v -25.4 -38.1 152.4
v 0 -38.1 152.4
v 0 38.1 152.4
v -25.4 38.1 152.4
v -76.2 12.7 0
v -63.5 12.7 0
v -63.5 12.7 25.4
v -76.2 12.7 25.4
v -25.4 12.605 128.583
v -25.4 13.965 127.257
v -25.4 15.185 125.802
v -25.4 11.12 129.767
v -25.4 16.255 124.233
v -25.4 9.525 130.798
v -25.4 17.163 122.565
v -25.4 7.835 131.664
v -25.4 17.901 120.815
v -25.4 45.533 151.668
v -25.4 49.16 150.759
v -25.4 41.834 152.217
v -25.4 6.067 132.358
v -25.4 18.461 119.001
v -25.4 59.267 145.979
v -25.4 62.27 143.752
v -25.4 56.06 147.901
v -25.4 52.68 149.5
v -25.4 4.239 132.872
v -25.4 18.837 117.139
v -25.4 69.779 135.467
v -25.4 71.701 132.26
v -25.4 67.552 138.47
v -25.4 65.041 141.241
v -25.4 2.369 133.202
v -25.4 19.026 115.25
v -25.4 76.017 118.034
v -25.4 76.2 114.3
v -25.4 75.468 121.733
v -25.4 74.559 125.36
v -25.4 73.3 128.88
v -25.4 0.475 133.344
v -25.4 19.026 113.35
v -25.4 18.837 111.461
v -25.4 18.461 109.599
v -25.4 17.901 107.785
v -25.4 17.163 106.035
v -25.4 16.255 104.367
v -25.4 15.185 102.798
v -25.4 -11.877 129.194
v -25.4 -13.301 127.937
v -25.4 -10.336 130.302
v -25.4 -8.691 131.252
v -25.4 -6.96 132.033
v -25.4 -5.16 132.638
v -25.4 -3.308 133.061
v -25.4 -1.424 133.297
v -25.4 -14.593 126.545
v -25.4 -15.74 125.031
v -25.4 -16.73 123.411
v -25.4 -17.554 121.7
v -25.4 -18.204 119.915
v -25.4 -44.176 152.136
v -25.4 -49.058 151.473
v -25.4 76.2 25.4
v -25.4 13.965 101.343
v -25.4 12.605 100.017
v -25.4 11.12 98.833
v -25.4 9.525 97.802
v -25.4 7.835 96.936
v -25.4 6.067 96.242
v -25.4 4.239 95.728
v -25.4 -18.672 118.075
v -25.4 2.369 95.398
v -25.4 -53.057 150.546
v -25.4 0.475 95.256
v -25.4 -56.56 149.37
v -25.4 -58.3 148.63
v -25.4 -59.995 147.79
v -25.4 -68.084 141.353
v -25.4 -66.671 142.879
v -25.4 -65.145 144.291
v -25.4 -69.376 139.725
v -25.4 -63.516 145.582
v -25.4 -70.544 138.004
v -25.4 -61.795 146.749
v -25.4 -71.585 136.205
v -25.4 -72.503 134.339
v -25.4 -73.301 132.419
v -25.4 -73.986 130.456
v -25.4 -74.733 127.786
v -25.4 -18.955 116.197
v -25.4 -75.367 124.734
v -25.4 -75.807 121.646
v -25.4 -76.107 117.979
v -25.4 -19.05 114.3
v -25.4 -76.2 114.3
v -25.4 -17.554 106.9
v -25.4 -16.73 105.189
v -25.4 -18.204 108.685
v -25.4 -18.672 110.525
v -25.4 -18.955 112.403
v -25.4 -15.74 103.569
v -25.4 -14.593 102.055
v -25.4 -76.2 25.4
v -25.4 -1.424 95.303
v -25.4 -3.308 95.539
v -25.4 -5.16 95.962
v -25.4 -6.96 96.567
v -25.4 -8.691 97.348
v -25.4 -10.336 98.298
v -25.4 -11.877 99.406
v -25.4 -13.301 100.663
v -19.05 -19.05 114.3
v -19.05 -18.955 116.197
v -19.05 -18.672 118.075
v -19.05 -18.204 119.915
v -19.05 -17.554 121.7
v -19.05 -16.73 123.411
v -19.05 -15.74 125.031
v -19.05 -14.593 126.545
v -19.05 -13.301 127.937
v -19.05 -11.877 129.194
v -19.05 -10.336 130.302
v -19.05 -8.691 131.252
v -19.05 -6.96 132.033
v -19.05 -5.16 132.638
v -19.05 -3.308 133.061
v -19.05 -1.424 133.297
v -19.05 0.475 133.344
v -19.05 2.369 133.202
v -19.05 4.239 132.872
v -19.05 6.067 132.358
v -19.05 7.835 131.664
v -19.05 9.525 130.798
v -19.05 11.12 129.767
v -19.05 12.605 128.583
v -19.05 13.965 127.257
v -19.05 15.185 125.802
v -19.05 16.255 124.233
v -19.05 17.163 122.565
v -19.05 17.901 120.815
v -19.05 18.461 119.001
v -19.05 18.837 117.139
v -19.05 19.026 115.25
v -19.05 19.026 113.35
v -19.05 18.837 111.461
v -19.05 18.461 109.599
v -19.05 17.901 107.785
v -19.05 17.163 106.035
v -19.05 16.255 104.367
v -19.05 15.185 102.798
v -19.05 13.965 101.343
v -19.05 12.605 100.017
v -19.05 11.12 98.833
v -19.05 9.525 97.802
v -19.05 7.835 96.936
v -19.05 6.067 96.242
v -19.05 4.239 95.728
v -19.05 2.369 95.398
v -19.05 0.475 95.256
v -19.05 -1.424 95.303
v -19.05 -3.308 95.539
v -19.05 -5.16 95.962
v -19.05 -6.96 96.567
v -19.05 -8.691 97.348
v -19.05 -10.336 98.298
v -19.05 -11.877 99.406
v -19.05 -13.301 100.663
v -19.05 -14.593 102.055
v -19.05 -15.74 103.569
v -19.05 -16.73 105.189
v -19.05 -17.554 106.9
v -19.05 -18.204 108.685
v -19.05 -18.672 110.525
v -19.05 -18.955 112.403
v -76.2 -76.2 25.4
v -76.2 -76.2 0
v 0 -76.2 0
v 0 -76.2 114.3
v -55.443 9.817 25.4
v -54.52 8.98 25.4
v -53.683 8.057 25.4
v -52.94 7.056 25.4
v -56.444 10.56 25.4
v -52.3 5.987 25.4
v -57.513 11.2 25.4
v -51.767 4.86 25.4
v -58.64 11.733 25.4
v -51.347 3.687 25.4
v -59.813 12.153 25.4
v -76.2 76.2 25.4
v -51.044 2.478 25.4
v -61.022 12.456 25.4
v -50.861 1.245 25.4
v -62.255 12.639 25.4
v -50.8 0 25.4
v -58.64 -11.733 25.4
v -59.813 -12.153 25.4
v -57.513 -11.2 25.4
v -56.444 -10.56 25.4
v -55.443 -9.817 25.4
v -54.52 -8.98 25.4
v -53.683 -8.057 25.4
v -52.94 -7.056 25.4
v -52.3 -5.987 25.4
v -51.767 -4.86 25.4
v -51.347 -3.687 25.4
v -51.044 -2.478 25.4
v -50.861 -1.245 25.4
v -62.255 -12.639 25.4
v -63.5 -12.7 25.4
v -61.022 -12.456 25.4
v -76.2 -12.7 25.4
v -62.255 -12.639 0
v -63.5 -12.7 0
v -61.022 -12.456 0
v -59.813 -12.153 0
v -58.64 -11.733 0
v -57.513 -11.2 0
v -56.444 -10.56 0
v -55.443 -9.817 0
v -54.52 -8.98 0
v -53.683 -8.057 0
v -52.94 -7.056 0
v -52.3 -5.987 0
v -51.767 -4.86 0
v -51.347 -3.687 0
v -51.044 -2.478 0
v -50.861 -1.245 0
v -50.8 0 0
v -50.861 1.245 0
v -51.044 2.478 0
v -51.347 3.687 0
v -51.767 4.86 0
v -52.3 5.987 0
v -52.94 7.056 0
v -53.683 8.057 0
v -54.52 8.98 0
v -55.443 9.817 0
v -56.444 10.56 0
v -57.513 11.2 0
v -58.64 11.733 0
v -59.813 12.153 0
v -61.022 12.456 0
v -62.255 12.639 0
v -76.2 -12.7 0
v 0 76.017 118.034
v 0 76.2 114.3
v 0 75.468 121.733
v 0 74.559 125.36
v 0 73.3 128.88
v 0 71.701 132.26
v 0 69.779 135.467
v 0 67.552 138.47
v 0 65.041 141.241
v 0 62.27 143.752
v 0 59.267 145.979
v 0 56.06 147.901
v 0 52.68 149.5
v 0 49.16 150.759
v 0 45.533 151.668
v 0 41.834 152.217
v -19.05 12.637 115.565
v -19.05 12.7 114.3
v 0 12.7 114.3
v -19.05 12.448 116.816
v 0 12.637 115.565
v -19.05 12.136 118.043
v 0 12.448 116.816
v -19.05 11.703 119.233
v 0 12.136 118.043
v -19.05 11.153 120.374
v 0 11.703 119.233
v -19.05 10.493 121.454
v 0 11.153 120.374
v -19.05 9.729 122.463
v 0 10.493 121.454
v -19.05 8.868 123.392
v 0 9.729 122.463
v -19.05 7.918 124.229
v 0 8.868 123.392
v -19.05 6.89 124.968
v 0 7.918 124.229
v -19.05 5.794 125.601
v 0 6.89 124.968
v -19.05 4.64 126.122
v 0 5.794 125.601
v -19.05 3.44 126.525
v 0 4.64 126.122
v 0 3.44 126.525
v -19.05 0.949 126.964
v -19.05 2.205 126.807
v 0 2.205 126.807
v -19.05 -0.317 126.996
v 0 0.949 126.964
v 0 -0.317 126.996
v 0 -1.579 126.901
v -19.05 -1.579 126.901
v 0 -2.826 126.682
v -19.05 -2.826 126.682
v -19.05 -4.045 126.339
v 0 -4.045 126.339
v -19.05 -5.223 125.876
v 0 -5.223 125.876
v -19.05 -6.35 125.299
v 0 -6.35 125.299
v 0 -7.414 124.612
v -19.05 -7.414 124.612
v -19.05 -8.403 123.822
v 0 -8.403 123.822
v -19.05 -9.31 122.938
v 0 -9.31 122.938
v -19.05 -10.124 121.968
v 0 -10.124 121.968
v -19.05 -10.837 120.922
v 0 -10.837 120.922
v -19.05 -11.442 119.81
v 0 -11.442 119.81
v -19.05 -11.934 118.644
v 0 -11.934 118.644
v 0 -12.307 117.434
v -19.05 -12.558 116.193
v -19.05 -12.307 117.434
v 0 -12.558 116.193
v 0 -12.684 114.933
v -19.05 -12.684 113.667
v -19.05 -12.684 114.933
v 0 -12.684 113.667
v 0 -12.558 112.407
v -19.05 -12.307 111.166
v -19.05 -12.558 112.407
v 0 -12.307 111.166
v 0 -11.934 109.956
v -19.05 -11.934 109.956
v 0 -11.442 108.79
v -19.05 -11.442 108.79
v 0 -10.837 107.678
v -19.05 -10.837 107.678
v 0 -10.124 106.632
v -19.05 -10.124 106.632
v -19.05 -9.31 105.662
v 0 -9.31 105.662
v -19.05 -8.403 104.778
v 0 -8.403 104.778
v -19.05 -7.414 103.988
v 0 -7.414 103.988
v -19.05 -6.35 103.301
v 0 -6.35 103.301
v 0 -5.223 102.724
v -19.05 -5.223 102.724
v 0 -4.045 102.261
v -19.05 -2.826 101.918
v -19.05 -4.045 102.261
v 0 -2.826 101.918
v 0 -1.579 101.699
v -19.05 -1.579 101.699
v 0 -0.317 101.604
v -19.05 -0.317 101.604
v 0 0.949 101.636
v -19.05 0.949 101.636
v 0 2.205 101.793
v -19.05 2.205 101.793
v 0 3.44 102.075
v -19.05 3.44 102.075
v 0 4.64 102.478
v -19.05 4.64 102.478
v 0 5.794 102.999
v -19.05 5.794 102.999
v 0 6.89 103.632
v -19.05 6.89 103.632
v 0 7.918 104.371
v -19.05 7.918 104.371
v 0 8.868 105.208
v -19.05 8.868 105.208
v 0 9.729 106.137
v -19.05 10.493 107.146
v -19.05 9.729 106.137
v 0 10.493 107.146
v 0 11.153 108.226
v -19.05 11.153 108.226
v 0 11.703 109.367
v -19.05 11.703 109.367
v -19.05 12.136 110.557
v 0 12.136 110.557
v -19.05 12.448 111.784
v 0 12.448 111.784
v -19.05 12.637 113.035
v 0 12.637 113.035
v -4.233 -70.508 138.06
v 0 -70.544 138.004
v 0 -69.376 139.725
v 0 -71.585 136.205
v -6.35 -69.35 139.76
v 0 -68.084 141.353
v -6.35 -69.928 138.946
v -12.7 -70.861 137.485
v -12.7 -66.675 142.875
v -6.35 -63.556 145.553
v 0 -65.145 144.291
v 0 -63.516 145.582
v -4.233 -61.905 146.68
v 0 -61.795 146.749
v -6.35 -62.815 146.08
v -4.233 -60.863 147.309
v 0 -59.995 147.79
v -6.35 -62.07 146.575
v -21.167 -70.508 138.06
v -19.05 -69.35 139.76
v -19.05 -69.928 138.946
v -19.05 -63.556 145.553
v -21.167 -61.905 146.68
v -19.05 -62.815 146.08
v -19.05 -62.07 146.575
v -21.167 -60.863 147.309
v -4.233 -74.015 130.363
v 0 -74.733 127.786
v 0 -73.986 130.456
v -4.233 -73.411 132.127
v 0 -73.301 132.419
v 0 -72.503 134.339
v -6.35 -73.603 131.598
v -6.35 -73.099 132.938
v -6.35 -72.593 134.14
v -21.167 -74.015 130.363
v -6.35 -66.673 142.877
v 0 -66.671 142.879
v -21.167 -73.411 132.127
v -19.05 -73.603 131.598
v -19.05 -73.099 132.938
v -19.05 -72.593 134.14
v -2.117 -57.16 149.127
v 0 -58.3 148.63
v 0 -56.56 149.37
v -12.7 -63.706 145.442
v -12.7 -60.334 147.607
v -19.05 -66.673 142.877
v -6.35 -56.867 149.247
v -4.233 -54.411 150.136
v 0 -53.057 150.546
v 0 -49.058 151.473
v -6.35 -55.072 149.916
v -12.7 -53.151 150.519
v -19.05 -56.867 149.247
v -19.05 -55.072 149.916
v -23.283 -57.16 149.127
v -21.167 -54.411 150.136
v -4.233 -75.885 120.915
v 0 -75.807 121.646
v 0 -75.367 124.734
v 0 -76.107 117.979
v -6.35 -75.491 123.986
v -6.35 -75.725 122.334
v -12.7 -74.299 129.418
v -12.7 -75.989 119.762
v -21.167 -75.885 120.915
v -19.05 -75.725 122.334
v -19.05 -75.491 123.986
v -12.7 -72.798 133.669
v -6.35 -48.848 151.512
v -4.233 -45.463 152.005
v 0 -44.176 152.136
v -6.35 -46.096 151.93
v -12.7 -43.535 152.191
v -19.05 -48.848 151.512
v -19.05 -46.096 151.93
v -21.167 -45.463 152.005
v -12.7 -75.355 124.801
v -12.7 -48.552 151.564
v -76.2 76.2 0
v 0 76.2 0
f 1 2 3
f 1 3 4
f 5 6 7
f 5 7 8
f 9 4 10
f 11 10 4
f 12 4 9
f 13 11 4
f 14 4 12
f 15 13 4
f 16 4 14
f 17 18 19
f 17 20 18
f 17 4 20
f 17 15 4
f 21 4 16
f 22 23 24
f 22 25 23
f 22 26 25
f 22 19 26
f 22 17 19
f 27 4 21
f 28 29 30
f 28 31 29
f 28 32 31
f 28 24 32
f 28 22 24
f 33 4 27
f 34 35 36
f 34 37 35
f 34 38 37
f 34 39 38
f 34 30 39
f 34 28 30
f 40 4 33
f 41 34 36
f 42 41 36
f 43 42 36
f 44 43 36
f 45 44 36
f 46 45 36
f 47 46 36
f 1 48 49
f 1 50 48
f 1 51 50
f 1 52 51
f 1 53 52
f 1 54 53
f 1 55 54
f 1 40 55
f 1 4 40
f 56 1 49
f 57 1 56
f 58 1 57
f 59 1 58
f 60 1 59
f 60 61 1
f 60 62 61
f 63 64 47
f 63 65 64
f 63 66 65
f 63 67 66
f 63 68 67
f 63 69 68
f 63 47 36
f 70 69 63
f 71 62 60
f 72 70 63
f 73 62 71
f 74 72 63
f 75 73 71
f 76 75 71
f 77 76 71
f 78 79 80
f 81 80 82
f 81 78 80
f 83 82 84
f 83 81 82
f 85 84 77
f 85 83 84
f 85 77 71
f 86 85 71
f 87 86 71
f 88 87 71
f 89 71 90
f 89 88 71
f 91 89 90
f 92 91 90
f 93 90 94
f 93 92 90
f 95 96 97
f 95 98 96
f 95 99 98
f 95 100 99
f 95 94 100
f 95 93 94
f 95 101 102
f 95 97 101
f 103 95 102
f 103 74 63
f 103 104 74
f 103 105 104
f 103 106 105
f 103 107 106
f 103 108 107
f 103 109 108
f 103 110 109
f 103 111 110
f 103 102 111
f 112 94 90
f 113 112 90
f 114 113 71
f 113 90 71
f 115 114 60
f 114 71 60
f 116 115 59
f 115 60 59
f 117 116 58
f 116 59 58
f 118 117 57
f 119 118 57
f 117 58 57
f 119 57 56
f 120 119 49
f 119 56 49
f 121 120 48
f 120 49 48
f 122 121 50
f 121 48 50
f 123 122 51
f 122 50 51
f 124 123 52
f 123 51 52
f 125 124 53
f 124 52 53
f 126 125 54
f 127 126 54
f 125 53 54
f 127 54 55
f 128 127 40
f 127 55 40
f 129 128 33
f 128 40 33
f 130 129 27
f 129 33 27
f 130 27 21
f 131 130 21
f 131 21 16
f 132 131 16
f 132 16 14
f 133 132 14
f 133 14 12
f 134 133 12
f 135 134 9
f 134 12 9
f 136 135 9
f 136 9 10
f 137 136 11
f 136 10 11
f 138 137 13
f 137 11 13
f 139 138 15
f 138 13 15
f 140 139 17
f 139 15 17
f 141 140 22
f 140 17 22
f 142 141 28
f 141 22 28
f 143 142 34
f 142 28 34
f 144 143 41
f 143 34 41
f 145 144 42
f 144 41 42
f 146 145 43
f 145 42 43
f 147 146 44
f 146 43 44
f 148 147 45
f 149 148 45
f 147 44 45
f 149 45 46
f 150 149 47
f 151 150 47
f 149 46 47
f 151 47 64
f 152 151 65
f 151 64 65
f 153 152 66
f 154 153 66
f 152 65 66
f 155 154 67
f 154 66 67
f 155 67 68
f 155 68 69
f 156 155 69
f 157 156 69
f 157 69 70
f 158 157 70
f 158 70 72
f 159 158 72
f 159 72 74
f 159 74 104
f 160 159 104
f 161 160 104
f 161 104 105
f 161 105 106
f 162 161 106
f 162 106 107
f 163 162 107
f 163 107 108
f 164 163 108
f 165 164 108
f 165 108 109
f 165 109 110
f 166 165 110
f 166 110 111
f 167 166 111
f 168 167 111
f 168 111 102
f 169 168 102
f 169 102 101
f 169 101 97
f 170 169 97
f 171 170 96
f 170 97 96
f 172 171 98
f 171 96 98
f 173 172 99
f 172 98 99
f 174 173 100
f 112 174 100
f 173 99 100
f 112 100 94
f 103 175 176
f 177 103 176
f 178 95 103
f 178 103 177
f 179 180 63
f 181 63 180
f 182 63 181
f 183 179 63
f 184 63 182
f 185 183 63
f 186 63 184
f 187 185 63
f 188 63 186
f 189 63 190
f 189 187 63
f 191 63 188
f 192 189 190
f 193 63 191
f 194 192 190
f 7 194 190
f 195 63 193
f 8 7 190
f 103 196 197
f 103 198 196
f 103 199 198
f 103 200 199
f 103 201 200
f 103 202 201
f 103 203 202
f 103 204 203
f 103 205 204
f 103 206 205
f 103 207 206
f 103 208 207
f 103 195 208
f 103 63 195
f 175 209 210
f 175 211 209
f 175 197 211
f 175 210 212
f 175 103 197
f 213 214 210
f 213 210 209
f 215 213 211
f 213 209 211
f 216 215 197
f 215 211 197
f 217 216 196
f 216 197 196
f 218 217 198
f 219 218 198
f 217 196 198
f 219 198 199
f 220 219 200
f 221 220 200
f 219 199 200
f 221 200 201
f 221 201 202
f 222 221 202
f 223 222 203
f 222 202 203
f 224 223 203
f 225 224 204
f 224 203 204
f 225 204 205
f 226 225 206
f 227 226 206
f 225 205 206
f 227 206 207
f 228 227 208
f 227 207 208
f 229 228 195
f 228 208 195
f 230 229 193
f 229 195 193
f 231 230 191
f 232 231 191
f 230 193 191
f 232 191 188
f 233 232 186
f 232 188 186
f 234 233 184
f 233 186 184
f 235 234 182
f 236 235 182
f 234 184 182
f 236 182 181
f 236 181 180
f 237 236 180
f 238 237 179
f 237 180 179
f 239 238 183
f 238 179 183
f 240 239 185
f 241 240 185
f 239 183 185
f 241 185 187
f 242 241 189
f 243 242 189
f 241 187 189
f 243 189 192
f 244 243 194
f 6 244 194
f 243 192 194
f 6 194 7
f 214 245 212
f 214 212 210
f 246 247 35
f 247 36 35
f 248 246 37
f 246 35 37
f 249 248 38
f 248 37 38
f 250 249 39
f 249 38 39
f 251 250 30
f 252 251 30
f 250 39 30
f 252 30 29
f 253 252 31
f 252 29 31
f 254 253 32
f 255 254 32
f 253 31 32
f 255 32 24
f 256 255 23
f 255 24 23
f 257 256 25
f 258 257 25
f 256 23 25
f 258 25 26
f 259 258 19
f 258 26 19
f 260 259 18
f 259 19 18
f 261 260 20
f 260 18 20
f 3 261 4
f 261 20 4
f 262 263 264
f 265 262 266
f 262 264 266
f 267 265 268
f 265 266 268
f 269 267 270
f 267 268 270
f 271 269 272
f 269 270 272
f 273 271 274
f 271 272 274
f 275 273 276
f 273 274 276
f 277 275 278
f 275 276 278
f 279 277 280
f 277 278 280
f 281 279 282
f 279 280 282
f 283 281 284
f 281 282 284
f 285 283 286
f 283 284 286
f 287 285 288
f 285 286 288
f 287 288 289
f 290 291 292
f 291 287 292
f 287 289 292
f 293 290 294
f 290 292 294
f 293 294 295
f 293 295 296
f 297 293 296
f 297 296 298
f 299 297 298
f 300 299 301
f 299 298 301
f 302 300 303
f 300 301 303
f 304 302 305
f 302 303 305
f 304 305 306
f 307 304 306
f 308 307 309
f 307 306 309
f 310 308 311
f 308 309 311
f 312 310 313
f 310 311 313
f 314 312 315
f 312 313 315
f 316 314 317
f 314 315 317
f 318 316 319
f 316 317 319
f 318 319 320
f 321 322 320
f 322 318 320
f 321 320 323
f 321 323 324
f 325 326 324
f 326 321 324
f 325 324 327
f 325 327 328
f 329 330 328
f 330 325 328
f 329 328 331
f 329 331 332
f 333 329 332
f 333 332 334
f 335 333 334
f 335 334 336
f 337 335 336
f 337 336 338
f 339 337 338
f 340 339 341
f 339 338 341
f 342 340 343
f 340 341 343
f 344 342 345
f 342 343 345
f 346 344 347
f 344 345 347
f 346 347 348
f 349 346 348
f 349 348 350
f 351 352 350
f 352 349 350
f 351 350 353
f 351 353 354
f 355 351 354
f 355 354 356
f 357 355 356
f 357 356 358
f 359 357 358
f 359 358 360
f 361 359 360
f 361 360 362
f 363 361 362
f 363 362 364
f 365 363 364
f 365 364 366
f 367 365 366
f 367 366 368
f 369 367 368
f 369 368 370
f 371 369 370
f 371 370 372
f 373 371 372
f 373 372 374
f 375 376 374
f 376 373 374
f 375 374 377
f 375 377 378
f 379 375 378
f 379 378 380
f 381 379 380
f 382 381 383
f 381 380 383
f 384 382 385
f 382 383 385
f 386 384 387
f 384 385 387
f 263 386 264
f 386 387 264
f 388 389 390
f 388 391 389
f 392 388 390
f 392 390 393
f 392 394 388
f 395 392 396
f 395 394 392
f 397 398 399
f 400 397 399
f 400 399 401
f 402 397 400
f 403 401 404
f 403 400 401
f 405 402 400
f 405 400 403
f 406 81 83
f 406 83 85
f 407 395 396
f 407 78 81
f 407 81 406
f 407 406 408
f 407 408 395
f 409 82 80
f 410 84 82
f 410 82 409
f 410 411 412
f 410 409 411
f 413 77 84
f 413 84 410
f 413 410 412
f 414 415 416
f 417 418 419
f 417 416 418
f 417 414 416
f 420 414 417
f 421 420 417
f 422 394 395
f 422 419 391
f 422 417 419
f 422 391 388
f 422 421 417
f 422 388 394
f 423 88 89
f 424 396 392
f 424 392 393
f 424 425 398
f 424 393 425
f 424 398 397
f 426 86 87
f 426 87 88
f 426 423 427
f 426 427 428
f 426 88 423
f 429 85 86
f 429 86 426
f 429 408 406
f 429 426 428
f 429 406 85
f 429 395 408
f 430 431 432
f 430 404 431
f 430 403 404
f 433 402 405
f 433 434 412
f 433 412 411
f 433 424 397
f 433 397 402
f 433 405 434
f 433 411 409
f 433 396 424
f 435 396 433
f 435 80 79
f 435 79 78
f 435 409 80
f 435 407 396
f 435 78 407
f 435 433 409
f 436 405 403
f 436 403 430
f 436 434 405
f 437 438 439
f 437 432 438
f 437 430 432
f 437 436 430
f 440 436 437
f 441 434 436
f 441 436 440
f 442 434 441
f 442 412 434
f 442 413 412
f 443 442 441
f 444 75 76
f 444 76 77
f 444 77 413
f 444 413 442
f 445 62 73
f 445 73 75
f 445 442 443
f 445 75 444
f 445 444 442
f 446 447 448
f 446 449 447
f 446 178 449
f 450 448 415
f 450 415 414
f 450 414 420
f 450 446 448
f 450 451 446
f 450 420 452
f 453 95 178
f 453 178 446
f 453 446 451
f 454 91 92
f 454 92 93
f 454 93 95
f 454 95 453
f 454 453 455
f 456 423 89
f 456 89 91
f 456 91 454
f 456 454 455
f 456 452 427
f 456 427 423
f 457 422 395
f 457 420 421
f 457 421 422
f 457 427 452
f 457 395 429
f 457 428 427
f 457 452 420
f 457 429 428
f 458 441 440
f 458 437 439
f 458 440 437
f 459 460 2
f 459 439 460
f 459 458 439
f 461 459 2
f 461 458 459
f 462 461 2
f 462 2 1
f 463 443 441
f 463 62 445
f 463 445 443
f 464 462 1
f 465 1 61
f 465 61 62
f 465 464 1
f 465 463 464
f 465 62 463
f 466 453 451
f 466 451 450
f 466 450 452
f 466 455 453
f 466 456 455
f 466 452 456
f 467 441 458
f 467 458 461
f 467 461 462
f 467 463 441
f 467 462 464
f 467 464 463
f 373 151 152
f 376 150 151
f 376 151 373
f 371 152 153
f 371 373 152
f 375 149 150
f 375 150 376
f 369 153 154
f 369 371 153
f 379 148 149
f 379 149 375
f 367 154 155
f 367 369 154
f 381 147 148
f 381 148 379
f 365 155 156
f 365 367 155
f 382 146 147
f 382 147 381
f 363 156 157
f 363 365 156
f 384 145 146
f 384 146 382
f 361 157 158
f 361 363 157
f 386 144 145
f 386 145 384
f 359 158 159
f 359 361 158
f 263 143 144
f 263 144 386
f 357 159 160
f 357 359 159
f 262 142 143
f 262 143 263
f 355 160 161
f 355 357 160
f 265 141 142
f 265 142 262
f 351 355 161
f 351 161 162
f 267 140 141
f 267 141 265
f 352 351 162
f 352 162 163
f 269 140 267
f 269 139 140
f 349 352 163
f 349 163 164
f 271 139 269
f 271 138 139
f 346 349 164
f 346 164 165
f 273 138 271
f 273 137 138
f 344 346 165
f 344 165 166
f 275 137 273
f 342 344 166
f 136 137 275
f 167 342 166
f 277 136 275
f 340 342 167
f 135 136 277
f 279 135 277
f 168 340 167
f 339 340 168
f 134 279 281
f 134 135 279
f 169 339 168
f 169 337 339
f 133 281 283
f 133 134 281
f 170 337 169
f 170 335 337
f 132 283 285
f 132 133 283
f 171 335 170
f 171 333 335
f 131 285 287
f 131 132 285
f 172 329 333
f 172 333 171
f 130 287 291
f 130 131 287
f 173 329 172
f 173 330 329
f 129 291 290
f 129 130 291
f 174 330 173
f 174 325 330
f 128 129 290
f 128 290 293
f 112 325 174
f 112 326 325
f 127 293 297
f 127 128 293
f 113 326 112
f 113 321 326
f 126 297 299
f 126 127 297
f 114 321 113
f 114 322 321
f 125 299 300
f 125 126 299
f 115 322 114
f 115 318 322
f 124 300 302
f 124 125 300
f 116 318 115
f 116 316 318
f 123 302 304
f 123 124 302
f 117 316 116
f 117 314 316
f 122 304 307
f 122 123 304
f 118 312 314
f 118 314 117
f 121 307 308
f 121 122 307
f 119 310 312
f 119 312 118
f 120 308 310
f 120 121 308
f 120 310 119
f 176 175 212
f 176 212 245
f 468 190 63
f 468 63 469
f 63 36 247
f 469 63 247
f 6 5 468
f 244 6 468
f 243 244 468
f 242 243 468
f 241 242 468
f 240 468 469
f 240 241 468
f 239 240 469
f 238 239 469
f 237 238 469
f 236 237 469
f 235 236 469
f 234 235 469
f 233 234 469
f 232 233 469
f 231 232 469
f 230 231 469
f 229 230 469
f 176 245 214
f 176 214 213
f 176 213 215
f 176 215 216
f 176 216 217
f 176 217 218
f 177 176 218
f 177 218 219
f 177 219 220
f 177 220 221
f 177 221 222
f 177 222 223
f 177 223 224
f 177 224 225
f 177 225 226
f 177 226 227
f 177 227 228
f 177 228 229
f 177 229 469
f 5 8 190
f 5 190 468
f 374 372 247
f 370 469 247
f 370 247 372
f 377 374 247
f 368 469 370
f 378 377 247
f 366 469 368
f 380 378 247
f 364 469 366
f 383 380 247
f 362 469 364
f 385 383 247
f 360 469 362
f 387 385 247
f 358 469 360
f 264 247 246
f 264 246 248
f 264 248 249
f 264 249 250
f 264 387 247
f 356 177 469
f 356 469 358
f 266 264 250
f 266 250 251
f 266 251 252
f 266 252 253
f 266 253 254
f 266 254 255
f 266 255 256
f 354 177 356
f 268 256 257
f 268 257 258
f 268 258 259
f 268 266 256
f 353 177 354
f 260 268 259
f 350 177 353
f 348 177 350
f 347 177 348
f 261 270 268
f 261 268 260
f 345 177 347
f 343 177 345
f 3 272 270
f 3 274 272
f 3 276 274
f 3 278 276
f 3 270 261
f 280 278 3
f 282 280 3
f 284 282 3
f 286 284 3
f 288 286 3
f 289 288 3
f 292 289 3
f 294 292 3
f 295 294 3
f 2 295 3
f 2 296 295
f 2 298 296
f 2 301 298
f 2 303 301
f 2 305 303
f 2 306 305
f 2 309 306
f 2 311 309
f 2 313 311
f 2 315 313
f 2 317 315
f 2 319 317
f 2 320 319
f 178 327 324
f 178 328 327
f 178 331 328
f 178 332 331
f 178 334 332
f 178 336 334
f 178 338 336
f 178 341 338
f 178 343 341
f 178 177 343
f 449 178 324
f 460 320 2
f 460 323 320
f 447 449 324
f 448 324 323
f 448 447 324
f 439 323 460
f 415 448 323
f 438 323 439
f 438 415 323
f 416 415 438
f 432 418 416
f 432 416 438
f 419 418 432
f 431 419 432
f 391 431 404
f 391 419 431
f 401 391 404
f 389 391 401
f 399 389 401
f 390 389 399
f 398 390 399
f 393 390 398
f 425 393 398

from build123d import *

# Parameters (mm, degrees)
F1_DEPTH    = 76.2
F2_R        = 12.7
F3_DEPTH    = 38.1
F5_DEPTH    = 25.4
F6_T1_DEPTH = 215.9
F7_R        = 38.1
F8_R        = 19.05
F8_R_2      = 12.7
F9_DEPTH    = 6.35


# Not quite as in the source:
# - a fillet or chamfer that OpenCascade refuses, or shapes differently, is made with other operations: its cross-section is extruded or revolved along the edge and cut away or added


with BuildPart() as f1:
    # F0 (on Front) → F1 (new body, symmetric)
    with BuildSketch(Plane.XZ):
        Polygon((-76.2, 0), (0, 0), (0, 152.4), (-25.4, 152.4), (-25.4, 25.4), (-76.2, 25.4), align=None)
    extrude(amount=F1_DEPTH, both=True)

    # F2 (on face) → F3 (cut)
    with BuildSketch(Plane.YZ):
        with Locations((0, 114.3)):
            Circle(F2_R)
    extrude(amount=-F3_DEPTH, mode=Mode.SUBTRACT)

    # F4 (on face) → F5 (cut)
    with BuildSketch(Plane.XY.offset(25.4)):
        with BuildLine():
            Line((-63.5, 12.7), (-76.2, 12.7))
            Line((-76.2, 12.7), (-76.2, -12.7))
            Line((-76.2, -12.7), (-63.5, -12.7))
            ThreePointArc((-63.5, -12.7), (-50.8, 0), (-63.5, 12.7))
        make_face()
    extrude(amount=-F5_DEPTH, mode=Mode.SUBTRACT)

    # F6: fillet of radius 38.1 on 1 edges, made by hand

    # F6_s2 → F6_t1 (cut)
    with BuildSketch(Plane.YZ.offset(-120.65)):
        with BuildLine():
            add(Edge.make_bspline(
                [(-76.2, 114.3), (-76.2, 152.4), (-38.1, 152.4)],
                knots=[0, 0, 0, 1, 1, 1], degree=2, weights=[1, 1, 1]))
            Line((-38.1, 152.4), (-76.2, 152.4))
            Line((-76.2, 152.4), (-76.2, 114.3))
        make_face()
    extrude(amount=F6_T1_DEPTH, mode=Mode.SUBTRACT)

    # F7
    f7_edges = [f1.edges().sort_by_distance(p)[0] for p in [
        (-12.7, 76.2, 152.4),
    ]]
    fillet(f7_edges, radius=F7_R)

    # F8 (on face) → F9 (cut)
    with BuildSketch(Plane(origin=(-25.4, 0, 0), x_dir=(0, -1, 0), z_dir=(-1, 0, 0))):
        with Locations((0, 114.3)):
            Circle(F8_R)
        with Locations((0, 114.3)):
            Circle(F8_R_2, mode=Mode.SUBTRACT)
    extrude(amount=-F9_DEPTH, mode=Mode.SUBTRACT)


solid = f1.part
